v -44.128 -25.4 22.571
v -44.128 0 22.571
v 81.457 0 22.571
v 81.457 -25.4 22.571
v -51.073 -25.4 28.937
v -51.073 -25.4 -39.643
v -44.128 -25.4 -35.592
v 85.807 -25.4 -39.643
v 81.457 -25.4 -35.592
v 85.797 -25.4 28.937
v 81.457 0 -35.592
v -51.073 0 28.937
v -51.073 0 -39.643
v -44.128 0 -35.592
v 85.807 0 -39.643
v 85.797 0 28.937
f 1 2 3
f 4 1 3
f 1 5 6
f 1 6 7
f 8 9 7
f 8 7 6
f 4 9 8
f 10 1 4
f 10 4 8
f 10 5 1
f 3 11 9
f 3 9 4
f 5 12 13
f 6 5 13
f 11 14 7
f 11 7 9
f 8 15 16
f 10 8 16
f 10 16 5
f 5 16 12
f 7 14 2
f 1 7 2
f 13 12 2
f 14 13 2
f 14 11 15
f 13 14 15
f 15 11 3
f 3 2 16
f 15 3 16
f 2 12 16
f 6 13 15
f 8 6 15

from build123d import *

# Parameters (mm, degrees)
F0_W     = 125.585321
F0_H     = 58.162786
F1_DEPTH = 25.4


with BuildPart() as f1:
    # F0 (on Front) → F1 (new body)
    with BuildSketch(Plane.XZ):
        Polygon((85.79734, 28.936708), (-51.07329, 28.936708), (-51.07329, -39.643291), (85.80731, -39.643291), align=None)
        with Locations((18.664179, -6.510761)):
            Rectangle(F0_W, F0_H, mode=Mode.SUBTRACT)
    extrude(amount=F1_DEPTH)


solid = f1.part
